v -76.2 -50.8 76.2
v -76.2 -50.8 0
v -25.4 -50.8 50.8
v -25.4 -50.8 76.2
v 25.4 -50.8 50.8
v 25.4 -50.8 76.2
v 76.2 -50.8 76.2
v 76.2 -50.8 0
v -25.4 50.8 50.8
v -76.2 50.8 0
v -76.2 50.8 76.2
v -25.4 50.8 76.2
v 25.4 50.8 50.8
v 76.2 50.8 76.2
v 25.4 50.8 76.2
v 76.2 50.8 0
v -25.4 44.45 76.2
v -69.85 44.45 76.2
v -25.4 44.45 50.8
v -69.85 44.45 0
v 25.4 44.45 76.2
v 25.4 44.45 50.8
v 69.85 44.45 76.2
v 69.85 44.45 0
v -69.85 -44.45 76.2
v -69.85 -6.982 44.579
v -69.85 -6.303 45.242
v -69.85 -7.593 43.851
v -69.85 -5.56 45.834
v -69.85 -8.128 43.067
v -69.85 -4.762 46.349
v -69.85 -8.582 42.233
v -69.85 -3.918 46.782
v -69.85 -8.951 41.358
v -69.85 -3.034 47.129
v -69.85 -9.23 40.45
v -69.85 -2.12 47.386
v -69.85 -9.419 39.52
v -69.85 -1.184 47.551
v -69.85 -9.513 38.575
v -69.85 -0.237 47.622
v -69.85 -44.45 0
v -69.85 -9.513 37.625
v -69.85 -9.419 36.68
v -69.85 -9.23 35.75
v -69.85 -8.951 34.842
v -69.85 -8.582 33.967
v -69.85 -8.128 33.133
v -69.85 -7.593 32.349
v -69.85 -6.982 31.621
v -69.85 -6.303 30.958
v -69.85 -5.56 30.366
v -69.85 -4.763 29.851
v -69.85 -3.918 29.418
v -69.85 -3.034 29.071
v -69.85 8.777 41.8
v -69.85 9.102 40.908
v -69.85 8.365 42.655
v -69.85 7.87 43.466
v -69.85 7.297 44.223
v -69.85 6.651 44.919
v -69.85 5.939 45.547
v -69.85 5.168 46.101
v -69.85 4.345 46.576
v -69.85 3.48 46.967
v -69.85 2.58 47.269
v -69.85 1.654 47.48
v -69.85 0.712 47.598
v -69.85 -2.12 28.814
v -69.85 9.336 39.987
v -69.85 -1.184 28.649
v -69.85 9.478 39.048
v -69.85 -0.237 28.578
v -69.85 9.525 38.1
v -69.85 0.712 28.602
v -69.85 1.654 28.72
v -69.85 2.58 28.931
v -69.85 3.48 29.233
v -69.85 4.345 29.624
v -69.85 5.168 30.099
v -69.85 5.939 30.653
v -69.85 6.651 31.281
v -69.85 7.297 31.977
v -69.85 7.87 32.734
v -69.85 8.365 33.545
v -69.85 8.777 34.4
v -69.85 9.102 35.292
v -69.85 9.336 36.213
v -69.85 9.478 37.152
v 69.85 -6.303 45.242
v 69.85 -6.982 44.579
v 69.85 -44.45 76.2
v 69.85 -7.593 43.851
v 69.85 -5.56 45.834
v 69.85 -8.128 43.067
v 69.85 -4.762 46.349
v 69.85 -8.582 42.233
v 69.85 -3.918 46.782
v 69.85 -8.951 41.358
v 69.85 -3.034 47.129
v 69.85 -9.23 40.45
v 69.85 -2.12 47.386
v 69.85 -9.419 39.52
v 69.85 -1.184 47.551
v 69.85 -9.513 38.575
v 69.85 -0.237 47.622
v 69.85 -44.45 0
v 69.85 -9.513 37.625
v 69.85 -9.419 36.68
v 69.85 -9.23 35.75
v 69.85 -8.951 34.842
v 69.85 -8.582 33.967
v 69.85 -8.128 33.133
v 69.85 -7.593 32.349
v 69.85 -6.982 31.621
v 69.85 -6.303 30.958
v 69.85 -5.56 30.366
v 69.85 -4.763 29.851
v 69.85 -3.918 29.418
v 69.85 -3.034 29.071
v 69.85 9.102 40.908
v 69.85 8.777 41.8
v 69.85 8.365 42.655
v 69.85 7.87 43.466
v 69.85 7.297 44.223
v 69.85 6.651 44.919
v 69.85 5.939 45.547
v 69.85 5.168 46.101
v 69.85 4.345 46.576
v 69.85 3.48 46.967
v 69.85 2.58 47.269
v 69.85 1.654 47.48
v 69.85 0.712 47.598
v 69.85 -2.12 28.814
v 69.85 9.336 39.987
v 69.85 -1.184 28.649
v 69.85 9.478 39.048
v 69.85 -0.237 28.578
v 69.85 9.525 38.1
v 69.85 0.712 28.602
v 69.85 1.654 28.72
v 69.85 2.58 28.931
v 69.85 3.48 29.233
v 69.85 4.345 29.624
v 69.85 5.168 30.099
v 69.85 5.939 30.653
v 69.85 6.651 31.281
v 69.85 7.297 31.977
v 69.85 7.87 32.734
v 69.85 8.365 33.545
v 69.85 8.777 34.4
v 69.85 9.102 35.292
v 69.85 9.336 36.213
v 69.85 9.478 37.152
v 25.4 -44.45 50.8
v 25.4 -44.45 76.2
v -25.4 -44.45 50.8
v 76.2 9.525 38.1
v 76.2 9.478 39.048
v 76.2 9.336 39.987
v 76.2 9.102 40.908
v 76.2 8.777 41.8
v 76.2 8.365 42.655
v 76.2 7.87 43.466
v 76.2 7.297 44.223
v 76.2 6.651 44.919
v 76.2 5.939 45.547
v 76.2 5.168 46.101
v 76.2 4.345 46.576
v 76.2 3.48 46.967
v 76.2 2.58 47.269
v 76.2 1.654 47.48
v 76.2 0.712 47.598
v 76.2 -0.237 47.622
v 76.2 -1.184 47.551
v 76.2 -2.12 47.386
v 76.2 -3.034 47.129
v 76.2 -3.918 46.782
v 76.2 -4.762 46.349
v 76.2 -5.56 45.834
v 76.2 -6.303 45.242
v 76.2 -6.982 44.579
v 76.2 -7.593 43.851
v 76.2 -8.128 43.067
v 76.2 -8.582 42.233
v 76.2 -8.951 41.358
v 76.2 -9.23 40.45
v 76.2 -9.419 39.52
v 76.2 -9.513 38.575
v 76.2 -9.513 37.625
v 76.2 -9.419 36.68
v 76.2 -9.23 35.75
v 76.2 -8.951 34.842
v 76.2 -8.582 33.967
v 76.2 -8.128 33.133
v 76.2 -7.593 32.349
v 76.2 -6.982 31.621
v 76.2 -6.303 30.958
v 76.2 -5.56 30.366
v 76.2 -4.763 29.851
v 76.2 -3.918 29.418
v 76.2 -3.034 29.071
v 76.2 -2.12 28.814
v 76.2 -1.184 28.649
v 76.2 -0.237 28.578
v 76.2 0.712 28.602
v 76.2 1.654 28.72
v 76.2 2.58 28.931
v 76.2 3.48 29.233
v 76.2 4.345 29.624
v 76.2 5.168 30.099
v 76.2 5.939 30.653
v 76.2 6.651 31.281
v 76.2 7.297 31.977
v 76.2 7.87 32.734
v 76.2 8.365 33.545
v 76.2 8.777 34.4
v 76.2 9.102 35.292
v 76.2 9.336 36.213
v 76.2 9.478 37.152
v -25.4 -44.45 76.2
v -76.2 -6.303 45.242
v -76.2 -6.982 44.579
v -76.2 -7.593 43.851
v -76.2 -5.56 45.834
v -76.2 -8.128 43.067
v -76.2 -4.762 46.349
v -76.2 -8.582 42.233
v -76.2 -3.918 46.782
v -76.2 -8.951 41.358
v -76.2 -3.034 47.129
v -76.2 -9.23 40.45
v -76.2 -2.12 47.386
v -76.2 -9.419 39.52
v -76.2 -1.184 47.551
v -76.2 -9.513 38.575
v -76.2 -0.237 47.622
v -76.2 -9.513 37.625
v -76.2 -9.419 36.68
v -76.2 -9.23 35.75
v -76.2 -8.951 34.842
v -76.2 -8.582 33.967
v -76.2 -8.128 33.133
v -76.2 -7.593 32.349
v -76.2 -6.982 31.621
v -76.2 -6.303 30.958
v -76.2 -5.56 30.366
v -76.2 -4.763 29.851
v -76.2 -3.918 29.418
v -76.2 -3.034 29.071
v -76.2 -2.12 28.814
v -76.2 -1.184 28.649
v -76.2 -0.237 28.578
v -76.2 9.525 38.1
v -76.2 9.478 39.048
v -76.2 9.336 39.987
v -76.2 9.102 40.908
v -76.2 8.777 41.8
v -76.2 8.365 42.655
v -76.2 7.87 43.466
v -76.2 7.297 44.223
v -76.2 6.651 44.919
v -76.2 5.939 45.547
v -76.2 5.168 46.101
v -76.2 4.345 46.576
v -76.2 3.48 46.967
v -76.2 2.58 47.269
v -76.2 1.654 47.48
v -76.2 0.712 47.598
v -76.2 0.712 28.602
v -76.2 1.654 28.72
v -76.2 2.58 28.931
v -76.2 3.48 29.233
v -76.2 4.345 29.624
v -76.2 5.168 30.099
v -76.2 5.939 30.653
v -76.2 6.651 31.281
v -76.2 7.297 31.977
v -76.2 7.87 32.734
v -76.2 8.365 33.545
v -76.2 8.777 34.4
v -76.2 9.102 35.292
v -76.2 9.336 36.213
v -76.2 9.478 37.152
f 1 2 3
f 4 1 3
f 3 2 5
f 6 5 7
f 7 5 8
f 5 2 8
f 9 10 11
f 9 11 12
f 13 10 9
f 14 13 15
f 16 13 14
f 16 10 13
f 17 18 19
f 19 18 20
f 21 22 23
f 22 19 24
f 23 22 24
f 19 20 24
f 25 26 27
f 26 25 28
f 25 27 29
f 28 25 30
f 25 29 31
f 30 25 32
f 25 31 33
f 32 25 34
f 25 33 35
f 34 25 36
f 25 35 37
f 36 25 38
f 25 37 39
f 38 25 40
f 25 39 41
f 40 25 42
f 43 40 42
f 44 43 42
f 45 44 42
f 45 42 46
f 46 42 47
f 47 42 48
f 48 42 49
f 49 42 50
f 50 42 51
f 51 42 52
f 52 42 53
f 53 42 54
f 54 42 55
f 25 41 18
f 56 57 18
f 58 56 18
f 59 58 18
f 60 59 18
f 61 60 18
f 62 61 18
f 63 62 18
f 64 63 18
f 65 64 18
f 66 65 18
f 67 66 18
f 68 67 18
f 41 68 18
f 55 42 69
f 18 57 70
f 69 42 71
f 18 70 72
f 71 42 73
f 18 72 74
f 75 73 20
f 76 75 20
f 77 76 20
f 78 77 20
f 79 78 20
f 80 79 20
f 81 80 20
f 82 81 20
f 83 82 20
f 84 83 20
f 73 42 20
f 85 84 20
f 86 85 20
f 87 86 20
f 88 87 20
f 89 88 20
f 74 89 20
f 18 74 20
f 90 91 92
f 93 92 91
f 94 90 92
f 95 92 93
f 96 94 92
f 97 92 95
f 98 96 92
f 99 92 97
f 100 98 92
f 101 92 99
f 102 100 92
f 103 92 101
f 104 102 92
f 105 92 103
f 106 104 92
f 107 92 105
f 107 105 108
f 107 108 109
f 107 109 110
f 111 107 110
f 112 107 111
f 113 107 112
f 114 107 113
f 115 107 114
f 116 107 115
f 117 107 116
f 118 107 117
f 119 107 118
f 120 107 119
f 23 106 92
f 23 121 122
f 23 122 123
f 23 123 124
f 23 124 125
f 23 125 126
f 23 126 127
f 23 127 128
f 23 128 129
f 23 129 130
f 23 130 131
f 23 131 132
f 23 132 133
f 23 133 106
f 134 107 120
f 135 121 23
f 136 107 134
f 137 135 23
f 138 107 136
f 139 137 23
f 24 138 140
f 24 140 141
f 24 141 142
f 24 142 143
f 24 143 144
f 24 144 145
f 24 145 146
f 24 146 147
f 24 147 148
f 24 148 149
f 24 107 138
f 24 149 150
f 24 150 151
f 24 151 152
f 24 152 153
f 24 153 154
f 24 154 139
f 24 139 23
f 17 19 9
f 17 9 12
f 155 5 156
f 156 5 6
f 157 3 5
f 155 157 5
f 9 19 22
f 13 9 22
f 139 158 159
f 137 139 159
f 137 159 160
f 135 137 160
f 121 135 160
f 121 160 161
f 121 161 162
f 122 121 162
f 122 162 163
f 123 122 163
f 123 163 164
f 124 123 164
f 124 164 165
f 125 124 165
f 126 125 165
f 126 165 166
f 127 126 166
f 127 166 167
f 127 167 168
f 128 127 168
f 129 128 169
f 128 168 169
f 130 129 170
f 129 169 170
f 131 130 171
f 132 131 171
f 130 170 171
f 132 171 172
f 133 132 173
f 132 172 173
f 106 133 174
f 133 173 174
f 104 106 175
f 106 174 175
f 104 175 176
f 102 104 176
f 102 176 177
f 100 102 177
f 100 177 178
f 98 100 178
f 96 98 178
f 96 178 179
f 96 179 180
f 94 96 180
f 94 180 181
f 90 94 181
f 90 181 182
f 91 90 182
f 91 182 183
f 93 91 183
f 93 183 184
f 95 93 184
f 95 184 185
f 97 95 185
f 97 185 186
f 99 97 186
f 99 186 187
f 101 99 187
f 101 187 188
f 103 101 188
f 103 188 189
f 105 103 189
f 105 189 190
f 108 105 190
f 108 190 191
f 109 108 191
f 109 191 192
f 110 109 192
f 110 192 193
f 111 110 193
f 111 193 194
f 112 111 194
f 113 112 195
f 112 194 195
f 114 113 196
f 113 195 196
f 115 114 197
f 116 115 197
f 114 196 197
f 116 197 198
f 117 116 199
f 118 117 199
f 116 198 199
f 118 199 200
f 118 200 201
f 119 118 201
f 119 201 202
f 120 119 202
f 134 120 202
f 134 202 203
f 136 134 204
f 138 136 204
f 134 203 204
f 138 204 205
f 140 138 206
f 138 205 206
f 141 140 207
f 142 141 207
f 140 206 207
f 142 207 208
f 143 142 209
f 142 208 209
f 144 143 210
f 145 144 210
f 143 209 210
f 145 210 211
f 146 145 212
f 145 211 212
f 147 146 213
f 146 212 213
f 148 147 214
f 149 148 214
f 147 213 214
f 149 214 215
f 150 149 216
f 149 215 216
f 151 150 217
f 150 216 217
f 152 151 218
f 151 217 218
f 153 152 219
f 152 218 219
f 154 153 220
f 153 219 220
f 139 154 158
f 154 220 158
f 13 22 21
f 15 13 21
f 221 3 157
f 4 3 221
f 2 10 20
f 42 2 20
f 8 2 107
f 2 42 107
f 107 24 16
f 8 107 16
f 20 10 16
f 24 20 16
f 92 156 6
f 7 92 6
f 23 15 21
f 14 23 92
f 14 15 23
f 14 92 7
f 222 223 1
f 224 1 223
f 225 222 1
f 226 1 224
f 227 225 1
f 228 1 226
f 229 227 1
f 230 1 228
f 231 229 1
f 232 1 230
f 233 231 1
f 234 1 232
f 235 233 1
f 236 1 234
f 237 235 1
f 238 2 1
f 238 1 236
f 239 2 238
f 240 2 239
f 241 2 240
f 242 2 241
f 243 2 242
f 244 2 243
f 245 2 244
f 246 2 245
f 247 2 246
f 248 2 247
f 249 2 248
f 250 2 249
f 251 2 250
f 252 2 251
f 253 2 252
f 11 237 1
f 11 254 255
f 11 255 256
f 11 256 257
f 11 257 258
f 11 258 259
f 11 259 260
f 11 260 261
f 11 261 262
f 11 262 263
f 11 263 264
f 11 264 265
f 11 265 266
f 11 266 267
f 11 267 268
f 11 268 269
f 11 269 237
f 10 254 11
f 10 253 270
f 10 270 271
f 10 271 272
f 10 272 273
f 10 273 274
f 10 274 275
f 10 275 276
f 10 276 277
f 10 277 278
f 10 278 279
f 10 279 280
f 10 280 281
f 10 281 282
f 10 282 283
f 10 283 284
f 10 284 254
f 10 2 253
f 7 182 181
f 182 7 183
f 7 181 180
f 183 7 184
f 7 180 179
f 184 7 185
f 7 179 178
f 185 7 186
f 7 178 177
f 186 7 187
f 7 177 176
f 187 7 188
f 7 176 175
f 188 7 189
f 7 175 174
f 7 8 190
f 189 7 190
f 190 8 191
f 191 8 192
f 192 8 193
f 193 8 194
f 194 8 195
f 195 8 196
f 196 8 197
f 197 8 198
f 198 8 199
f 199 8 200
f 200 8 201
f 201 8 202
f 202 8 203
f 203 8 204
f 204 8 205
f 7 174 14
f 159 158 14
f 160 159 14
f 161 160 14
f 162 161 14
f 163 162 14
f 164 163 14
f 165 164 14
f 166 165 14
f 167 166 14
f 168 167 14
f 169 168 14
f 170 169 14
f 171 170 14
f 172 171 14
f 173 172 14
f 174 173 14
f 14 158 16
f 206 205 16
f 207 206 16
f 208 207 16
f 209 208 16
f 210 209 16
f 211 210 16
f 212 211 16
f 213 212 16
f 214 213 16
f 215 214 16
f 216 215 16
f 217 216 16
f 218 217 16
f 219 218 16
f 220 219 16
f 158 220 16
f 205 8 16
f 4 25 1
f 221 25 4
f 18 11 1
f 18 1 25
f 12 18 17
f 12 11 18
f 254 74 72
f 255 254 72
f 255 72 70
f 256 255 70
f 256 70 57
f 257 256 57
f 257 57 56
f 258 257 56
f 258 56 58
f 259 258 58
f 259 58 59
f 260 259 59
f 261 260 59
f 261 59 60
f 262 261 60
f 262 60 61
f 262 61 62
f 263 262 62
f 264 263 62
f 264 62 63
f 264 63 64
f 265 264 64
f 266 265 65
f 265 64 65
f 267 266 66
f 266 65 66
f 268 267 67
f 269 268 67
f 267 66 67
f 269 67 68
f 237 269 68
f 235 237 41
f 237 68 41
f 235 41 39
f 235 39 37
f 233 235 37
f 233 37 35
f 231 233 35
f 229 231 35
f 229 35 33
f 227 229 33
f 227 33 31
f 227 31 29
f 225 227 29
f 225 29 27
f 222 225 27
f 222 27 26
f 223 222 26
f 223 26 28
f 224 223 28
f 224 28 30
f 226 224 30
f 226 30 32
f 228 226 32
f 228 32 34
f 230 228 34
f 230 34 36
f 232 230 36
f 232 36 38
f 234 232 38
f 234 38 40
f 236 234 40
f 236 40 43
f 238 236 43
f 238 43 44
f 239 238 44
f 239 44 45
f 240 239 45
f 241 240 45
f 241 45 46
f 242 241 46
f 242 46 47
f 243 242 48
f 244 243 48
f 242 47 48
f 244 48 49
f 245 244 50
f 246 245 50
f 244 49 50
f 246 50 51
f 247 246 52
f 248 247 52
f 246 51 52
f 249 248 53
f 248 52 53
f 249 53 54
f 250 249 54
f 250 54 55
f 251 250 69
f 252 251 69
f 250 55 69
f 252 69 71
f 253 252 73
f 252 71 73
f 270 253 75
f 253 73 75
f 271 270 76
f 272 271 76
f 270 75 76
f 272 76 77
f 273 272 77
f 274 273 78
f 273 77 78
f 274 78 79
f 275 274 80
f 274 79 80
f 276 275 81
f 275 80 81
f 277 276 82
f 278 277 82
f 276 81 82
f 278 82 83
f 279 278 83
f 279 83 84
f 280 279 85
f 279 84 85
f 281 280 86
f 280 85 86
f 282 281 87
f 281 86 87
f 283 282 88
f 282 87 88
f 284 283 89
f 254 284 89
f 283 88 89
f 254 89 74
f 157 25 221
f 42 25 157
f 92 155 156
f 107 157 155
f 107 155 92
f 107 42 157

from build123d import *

# Parameters (mm, degrees)
F0_W     = 152.4
F0_H     = 101.6
F0_W_2   = 139.7
F0_H_2   = 88.9
F1_DEPTH = 76.2
F2_W     = 50.8
F2_H     = 25.4
F3_DEPTH = 101.601
F4_R     = 9.525
F5_DEPTH = 152.401


with BuildPart() as f1:
    # F0 (on Top) → F1 (new body)
    with BuildSketch(Plane.XY):
        Rectangle(F0_W, F0_H)
        Rectangle(F0_W_2, F0_H_2, mode=Mode.SUBTRACT)
    extrude(amount=F1_DEPTH)

    # F2 (on face) → F3 (cut, through all)
    with BuildSketch(Plane.XZ.offset(50.8)):
        with Locations((0, 63.5)):
            Rectangle(F2_W, F2_H)
    extrude(amount=-F3_DEPTH, mode=Mode.SUBTRACT)

    # F4 (on face) → F5 (cut, through all)
    with BuildSketch(Plane.YZ.offset(76.2)):
        with Locations((0, 38.1)):
            Circle(F4_R)
    extrude(amount=-F5_DEPTH, mode=Mode.SUBTRACT)


solid = f1.part
